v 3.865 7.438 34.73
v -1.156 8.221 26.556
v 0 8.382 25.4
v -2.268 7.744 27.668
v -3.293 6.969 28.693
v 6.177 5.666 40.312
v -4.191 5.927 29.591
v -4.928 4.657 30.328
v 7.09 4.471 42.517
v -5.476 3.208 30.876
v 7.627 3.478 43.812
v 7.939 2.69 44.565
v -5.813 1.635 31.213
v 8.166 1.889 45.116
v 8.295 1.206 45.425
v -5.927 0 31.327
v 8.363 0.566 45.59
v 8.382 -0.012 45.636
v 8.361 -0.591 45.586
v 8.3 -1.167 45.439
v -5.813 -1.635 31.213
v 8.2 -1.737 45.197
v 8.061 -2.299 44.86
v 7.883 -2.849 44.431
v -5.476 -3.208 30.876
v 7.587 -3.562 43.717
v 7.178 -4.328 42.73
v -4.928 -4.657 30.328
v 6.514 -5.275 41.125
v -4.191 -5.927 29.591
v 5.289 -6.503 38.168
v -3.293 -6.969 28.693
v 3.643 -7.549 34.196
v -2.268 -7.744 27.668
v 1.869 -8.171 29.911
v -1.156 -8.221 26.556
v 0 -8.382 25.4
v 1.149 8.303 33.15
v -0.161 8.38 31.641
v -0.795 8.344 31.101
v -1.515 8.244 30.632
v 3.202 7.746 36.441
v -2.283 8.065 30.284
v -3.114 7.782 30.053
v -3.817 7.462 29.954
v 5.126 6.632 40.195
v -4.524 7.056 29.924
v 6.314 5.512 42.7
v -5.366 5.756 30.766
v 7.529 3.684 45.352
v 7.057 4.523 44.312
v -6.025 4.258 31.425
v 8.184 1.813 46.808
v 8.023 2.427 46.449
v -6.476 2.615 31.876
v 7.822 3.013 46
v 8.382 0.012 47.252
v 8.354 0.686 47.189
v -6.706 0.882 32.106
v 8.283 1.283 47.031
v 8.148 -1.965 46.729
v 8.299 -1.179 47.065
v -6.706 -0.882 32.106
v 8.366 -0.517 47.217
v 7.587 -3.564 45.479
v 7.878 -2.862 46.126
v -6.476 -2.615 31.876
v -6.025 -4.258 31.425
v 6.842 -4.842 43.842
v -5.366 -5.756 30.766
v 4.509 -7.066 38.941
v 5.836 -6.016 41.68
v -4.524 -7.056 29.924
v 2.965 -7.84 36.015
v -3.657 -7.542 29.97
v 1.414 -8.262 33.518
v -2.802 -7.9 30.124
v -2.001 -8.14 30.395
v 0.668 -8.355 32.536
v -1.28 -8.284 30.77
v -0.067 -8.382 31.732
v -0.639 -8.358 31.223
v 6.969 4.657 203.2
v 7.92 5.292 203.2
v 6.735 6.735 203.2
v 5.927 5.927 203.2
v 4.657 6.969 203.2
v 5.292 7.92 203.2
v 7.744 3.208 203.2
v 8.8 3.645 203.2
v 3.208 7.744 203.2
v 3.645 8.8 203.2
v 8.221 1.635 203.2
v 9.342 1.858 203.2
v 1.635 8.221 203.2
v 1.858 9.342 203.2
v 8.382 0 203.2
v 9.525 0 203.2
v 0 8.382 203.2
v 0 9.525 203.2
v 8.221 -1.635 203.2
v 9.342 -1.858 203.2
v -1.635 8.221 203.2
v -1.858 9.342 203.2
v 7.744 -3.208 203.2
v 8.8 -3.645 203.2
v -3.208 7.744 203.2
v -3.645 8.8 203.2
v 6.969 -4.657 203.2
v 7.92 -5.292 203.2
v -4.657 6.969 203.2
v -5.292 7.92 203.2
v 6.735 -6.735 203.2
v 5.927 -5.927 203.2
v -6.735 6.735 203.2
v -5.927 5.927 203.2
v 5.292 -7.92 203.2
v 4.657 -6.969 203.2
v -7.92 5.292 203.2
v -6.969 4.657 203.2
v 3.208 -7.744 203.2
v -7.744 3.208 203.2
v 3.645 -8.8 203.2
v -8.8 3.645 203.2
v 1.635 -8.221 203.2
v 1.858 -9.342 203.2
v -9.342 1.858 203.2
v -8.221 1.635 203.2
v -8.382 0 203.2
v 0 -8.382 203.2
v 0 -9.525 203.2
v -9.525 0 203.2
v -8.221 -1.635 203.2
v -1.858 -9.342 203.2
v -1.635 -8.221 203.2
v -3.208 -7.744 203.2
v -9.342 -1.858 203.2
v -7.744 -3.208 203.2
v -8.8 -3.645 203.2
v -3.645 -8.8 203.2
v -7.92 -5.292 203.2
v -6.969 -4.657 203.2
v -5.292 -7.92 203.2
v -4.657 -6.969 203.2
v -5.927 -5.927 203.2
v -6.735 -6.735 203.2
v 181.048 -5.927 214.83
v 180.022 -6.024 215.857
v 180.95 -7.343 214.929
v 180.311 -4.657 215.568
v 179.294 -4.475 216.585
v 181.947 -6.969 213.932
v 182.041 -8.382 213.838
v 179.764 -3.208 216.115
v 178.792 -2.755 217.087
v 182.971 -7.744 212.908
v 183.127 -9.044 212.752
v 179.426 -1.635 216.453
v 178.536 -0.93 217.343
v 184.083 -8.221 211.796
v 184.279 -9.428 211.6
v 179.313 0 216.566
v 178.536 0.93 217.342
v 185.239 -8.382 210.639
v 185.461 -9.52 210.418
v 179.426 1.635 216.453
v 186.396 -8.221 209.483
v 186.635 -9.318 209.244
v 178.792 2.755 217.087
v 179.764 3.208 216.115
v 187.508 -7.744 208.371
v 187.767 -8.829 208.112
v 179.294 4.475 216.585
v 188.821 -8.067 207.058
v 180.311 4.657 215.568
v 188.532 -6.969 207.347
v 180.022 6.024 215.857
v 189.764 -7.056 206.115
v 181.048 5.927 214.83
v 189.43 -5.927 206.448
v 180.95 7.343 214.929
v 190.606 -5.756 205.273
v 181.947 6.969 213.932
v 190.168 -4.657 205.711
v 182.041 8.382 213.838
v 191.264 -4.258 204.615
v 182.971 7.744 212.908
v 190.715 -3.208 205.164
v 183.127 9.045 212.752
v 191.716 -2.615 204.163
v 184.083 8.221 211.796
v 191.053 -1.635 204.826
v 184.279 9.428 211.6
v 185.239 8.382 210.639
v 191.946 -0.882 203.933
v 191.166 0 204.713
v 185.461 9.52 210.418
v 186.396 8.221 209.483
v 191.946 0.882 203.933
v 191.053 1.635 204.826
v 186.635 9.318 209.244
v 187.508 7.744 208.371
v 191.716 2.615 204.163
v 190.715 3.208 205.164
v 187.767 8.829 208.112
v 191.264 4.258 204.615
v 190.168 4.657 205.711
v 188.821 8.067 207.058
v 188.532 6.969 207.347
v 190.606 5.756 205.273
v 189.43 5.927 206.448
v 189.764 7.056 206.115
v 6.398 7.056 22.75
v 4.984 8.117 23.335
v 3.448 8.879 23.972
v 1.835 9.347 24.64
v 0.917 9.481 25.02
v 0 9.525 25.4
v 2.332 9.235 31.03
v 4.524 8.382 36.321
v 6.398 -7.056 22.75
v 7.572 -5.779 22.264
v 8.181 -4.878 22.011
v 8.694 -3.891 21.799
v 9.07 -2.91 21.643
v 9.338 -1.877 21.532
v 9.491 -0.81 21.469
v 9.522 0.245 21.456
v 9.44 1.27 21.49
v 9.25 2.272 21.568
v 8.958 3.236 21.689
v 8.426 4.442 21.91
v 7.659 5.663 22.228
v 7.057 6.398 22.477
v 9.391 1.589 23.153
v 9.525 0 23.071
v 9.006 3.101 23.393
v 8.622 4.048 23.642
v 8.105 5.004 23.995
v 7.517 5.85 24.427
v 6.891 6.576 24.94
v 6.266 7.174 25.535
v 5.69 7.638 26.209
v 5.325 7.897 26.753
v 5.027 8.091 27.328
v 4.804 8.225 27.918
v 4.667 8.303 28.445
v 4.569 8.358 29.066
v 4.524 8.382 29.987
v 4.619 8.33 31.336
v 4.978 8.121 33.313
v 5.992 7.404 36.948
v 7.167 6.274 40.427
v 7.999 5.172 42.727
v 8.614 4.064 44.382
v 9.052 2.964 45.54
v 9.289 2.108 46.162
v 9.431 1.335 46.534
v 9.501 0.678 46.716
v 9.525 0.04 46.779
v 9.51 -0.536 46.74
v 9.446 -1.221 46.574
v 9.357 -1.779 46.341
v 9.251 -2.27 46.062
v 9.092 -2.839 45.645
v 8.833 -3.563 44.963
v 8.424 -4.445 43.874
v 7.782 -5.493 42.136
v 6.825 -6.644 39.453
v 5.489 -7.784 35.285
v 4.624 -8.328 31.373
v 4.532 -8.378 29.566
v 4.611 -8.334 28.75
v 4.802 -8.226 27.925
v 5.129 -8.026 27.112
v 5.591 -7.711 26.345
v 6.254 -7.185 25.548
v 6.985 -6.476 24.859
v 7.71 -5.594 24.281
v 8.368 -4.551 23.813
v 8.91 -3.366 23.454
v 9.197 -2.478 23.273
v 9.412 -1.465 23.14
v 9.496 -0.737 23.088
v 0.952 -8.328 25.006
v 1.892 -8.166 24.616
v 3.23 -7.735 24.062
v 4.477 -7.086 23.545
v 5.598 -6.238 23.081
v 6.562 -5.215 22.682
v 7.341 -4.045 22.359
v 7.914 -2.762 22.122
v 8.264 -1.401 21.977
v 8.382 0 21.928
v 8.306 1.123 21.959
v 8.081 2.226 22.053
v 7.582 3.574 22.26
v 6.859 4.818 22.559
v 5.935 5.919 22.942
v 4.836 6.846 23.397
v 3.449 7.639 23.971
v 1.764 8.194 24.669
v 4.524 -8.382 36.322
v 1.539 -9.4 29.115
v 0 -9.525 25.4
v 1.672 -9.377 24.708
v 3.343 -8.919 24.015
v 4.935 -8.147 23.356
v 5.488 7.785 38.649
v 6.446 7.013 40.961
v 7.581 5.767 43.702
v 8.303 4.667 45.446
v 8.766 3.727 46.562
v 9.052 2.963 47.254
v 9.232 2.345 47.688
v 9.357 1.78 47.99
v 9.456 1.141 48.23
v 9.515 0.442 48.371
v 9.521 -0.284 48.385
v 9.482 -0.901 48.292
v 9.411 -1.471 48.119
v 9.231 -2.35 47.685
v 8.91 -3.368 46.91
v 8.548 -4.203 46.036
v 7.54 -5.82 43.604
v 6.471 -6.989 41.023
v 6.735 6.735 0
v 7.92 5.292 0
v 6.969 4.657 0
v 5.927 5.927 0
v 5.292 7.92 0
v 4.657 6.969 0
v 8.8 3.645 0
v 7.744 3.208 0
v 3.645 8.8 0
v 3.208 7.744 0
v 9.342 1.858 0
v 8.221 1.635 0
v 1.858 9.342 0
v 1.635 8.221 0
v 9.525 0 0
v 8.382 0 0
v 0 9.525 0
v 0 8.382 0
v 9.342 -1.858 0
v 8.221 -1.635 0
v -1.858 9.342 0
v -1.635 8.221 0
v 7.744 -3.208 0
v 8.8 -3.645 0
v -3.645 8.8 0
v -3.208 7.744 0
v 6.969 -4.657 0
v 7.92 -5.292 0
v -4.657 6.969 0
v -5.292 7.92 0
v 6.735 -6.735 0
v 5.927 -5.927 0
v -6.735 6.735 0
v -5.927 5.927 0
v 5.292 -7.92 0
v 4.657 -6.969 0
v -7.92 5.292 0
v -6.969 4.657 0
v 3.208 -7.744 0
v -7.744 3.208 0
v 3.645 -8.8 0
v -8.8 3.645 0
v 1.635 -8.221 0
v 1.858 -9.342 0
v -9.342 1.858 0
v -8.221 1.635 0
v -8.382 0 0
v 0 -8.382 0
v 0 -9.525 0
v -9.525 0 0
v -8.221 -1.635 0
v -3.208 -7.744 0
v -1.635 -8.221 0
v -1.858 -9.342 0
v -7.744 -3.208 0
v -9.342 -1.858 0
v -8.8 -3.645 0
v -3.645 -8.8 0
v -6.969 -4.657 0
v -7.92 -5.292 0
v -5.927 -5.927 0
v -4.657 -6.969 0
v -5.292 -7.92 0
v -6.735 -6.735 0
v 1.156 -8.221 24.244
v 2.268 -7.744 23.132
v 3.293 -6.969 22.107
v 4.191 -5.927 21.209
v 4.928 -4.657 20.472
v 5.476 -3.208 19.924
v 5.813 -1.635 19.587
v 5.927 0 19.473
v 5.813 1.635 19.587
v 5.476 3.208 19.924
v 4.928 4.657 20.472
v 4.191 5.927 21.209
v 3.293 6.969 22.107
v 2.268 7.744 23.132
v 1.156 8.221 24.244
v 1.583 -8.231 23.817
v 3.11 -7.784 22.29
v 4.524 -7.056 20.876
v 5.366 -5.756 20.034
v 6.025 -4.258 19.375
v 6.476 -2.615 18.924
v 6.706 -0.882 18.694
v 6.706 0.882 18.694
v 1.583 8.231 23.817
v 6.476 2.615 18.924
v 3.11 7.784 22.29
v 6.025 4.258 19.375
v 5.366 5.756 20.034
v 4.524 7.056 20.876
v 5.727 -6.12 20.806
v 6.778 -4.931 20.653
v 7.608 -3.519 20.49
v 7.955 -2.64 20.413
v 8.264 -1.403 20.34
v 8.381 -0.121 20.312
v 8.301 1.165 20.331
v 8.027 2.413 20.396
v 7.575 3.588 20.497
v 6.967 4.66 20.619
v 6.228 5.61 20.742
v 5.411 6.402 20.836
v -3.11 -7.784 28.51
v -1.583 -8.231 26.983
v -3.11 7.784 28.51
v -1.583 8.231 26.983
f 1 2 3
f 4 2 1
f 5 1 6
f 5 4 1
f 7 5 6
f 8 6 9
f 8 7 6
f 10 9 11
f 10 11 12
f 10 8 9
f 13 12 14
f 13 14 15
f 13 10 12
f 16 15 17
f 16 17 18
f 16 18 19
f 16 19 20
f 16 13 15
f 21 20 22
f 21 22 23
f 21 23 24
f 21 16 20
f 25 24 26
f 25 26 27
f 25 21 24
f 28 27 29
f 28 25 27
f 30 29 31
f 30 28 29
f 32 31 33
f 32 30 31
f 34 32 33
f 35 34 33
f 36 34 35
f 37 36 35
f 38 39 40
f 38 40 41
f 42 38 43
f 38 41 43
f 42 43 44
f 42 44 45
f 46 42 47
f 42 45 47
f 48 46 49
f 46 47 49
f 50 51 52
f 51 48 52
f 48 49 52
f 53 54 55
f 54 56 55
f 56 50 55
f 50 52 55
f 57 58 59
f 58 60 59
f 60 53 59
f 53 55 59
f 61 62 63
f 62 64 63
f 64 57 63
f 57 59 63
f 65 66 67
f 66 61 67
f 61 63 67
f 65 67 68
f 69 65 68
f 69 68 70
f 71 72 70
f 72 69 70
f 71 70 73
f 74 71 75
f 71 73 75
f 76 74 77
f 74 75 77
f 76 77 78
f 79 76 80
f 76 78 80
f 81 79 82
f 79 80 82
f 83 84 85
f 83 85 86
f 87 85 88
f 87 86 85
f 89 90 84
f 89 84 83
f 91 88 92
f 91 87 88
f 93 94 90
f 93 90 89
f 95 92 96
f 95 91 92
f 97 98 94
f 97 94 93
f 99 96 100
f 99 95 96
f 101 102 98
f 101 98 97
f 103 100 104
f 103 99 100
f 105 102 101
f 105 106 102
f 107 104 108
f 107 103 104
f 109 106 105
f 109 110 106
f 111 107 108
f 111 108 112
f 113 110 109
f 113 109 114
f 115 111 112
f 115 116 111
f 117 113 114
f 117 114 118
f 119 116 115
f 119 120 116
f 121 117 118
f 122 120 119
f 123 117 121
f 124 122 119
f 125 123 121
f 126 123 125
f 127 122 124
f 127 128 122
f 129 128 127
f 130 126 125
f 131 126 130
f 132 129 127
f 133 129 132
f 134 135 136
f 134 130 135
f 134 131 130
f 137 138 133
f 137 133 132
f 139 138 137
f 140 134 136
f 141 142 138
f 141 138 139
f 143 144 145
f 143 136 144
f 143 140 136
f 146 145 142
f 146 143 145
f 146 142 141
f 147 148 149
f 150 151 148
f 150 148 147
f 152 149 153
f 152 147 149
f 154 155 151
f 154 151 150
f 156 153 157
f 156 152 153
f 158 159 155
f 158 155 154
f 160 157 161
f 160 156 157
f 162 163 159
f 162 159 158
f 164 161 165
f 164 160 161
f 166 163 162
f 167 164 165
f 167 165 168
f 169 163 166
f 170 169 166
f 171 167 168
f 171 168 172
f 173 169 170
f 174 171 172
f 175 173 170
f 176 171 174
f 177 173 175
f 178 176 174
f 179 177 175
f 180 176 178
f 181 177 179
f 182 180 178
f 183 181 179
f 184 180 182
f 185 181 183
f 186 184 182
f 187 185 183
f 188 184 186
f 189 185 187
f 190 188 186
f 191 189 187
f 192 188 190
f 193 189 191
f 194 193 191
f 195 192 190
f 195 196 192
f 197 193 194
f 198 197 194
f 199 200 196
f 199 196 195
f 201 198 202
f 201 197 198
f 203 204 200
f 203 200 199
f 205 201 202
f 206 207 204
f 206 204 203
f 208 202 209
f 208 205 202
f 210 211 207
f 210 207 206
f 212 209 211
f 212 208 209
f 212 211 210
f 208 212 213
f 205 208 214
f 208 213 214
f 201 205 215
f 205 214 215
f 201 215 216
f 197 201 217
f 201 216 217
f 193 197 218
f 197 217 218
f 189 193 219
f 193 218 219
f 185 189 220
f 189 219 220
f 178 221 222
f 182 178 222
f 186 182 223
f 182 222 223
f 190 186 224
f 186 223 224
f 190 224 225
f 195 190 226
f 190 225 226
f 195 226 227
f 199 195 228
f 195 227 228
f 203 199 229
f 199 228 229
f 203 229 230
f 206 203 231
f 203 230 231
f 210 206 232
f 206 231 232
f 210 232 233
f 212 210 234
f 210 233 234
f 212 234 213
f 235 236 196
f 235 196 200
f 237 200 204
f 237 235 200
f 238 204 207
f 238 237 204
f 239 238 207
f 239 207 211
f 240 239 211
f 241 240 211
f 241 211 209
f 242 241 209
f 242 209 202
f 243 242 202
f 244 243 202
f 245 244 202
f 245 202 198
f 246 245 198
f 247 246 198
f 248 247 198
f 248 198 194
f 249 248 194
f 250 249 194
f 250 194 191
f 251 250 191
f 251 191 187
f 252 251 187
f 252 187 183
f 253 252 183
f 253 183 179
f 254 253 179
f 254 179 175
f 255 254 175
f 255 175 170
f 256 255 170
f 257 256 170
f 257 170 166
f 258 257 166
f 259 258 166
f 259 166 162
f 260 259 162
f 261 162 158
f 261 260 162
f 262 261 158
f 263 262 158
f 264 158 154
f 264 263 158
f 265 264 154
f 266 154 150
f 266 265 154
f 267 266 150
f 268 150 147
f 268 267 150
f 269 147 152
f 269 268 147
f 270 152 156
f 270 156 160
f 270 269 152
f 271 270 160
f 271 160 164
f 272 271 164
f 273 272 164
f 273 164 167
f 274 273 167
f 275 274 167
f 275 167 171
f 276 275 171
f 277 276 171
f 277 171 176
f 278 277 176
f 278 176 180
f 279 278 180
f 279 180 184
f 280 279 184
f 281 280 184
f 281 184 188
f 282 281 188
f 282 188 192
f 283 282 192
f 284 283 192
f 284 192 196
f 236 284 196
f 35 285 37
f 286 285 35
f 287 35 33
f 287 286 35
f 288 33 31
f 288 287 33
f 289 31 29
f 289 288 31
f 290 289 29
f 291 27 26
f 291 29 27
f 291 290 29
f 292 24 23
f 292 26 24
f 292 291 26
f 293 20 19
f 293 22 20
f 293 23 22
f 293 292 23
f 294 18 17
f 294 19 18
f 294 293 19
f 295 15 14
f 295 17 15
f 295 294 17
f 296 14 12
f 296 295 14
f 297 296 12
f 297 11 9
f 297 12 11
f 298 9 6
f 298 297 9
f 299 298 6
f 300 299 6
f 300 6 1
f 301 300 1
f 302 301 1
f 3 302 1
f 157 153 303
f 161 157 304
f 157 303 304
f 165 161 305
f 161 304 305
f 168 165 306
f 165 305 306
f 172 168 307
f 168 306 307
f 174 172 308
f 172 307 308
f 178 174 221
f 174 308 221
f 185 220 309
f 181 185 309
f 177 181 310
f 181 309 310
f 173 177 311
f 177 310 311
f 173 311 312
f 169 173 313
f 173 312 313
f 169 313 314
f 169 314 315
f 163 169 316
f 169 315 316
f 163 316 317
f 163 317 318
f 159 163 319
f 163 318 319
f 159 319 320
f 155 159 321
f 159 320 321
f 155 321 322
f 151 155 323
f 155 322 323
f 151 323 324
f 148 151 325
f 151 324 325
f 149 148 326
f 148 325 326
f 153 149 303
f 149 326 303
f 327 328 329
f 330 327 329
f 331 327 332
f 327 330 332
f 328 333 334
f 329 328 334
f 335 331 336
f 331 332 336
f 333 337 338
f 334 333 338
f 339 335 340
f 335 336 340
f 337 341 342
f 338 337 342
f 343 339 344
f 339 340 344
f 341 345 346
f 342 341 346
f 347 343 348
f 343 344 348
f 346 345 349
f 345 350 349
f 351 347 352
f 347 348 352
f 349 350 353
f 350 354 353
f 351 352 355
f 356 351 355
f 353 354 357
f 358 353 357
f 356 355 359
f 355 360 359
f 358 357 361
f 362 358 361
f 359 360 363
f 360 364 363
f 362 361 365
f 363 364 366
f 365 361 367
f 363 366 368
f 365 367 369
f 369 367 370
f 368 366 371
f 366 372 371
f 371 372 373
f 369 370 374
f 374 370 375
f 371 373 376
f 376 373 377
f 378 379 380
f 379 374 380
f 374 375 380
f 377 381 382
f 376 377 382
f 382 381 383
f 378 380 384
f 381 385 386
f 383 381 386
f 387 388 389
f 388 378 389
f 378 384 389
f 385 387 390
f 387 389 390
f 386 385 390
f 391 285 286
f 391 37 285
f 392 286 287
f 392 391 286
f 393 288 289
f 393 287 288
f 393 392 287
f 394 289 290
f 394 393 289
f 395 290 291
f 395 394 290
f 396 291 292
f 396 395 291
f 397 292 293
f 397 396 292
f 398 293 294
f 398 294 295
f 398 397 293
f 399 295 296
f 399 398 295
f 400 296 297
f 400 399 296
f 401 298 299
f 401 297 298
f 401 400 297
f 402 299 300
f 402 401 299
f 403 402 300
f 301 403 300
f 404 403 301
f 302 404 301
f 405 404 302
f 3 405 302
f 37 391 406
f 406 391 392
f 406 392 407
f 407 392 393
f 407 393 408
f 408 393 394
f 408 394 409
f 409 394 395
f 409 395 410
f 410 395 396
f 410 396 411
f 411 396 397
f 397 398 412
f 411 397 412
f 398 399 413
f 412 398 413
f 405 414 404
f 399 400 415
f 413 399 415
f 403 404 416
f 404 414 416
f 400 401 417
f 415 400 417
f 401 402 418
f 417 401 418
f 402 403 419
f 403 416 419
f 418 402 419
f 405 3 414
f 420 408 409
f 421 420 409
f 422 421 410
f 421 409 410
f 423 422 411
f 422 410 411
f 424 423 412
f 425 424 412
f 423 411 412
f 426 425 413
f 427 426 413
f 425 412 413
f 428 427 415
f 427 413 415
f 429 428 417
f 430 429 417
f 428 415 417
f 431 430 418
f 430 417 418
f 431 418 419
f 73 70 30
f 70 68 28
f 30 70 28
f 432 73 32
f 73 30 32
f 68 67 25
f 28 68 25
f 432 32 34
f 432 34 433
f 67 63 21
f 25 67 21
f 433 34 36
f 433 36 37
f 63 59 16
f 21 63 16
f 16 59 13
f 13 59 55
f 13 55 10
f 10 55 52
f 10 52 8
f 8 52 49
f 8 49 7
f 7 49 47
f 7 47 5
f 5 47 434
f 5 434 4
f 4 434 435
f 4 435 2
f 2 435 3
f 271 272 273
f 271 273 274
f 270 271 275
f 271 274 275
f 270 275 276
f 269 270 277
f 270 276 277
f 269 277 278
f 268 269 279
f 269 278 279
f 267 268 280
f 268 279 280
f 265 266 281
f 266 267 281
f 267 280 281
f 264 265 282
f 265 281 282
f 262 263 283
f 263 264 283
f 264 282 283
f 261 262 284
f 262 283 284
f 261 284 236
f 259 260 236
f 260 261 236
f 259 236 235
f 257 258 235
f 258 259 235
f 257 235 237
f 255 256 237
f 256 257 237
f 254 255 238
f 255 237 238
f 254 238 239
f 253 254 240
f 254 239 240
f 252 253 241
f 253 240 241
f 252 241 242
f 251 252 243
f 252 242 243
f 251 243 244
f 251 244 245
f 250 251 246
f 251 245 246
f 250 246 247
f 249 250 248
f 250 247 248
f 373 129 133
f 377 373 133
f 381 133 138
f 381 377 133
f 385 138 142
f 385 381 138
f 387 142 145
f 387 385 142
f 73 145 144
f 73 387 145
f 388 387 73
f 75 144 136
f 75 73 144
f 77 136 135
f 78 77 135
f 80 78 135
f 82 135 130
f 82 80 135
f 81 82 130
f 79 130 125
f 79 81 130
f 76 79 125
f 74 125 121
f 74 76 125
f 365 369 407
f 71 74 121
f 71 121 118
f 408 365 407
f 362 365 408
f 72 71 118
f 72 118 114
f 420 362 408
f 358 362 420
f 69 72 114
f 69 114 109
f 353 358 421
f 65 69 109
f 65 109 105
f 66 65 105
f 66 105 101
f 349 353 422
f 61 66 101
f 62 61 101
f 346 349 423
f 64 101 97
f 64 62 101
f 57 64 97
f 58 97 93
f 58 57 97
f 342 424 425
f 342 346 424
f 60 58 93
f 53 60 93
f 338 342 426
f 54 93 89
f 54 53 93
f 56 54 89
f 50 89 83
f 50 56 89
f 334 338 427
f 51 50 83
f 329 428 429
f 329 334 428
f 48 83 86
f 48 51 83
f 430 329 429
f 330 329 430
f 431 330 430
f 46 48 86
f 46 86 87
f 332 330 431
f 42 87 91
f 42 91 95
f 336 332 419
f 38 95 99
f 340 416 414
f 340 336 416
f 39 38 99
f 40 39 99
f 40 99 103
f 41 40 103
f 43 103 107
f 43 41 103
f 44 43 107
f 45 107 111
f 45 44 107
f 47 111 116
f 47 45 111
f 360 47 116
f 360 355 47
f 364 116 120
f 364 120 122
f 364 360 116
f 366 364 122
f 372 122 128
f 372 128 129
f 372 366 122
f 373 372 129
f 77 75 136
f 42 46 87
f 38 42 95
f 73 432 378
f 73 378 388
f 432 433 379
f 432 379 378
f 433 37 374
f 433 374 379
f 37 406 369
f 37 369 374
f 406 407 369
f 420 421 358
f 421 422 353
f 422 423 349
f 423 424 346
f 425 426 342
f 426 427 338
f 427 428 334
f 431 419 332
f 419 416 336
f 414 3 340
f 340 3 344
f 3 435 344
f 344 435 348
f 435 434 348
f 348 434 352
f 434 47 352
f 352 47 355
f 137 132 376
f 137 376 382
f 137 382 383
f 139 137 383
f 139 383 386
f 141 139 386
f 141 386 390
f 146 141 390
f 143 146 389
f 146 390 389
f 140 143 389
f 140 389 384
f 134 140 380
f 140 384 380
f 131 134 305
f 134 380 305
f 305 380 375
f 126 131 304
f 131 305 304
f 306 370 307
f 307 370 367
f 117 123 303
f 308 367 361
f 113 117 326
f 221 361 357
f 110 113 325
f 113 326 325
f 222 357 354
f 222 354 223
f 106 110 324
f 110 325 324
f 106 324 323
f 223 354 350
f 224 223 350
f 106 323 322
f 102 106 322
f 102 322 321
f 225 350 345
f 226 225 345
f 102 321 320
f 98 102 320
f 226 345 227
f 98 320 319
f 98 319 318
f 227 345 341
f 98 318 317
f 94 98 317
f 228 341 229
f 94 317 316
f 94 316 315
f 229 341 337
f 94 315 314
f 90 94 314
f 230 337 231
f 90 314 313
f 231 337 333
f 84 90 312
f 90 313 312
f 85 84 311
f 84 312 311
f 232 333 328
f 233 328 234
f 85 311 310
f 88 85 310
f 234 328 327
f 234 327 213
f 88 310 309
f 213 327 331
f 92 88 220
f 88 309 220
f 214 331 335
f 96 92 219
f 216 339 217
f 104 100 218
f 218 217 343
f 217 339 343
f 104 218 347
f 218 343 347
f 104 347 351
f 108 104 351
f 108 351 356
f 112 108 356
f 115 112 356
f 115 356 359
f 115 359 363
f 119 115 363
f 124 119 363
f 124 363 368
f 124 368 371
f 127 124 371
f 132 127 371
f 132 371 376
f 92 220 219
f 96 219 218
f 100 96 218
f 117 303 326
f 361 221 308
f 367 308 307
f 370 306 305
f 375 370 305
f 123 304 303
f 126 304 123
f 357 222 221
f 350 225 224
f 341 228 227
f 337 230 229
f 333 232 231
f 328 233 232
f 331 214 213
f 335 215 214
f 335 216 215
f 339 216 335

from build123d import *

# Parameters (mm, degrees)
SKETCH1_R             = 9.525
SKETCH1_R_2           = 8.382
BOSS_EXTRUDE2_DEPTH   = 203.2
SWEEP_THIN1_START     = 17.960512242
SWEEP_THIN1_OUTLINE_R = 8.382
SWEEP_THIN1_DEPTH     = 261.968195874


# Read off the part's stored shape, not the designer's step: Sweep-Thin1
with BuildPart() as part:
    # Sketch1 → Boss-Extrude2 (new body)
    with BuildSketch(Plane.XY):
        with Locations(Location((0, 0, 0), (0, 0, 180))):
            Circle(SKETCH1_R)
        with Locations(Location((0, 0, 0), (0, 0, 180))):
            Circle(SKETCH1_R_2, mode=Mode.SUBTRACT)
    extrude(amount=BOSS_EXTRUDE2_DEPTH)

    # Sweep-Thin1 outline → Sweep-Thin1 (add)
    with BuildSketch(Plane(origin=(0, 0, 0), x_dir=(0.7071067811865474, 0, -0.7071067811865477), z_dir=(0.7071067811865476, 0, 0.7071067811865476)).offset(SWEEP_THIN1_START)):
        with BuildLine():
            ThreePointArc((-22.484132156, 8.382272238), (-27.48551224, 0.000176979), (-22.484443646, -8.382104131))
            ThreePointArc((-22.484443646, -8.382104131), (-16.812644927, -9.455581718), (-11.562434249, -7.056218747))
            ThreePointArc((-11.562434249, -7.056218747), (-8.435512242, 0), (-11.562434249, 7.056218747))
            ThreePointArc((-11.562434249, 7.056218747), (-16.812469239, 9.455560389), (-22.484132156, 8.382272238))
        make_face()
        with Locations((-17.960512242, 0)):
            Circle(SWEEP_THIN1_OUTLINE_R, mode=Mode.SUBTRACT)
    extrude(amount=SWEEP_THIN1_DEPTH)


solid = part.part
